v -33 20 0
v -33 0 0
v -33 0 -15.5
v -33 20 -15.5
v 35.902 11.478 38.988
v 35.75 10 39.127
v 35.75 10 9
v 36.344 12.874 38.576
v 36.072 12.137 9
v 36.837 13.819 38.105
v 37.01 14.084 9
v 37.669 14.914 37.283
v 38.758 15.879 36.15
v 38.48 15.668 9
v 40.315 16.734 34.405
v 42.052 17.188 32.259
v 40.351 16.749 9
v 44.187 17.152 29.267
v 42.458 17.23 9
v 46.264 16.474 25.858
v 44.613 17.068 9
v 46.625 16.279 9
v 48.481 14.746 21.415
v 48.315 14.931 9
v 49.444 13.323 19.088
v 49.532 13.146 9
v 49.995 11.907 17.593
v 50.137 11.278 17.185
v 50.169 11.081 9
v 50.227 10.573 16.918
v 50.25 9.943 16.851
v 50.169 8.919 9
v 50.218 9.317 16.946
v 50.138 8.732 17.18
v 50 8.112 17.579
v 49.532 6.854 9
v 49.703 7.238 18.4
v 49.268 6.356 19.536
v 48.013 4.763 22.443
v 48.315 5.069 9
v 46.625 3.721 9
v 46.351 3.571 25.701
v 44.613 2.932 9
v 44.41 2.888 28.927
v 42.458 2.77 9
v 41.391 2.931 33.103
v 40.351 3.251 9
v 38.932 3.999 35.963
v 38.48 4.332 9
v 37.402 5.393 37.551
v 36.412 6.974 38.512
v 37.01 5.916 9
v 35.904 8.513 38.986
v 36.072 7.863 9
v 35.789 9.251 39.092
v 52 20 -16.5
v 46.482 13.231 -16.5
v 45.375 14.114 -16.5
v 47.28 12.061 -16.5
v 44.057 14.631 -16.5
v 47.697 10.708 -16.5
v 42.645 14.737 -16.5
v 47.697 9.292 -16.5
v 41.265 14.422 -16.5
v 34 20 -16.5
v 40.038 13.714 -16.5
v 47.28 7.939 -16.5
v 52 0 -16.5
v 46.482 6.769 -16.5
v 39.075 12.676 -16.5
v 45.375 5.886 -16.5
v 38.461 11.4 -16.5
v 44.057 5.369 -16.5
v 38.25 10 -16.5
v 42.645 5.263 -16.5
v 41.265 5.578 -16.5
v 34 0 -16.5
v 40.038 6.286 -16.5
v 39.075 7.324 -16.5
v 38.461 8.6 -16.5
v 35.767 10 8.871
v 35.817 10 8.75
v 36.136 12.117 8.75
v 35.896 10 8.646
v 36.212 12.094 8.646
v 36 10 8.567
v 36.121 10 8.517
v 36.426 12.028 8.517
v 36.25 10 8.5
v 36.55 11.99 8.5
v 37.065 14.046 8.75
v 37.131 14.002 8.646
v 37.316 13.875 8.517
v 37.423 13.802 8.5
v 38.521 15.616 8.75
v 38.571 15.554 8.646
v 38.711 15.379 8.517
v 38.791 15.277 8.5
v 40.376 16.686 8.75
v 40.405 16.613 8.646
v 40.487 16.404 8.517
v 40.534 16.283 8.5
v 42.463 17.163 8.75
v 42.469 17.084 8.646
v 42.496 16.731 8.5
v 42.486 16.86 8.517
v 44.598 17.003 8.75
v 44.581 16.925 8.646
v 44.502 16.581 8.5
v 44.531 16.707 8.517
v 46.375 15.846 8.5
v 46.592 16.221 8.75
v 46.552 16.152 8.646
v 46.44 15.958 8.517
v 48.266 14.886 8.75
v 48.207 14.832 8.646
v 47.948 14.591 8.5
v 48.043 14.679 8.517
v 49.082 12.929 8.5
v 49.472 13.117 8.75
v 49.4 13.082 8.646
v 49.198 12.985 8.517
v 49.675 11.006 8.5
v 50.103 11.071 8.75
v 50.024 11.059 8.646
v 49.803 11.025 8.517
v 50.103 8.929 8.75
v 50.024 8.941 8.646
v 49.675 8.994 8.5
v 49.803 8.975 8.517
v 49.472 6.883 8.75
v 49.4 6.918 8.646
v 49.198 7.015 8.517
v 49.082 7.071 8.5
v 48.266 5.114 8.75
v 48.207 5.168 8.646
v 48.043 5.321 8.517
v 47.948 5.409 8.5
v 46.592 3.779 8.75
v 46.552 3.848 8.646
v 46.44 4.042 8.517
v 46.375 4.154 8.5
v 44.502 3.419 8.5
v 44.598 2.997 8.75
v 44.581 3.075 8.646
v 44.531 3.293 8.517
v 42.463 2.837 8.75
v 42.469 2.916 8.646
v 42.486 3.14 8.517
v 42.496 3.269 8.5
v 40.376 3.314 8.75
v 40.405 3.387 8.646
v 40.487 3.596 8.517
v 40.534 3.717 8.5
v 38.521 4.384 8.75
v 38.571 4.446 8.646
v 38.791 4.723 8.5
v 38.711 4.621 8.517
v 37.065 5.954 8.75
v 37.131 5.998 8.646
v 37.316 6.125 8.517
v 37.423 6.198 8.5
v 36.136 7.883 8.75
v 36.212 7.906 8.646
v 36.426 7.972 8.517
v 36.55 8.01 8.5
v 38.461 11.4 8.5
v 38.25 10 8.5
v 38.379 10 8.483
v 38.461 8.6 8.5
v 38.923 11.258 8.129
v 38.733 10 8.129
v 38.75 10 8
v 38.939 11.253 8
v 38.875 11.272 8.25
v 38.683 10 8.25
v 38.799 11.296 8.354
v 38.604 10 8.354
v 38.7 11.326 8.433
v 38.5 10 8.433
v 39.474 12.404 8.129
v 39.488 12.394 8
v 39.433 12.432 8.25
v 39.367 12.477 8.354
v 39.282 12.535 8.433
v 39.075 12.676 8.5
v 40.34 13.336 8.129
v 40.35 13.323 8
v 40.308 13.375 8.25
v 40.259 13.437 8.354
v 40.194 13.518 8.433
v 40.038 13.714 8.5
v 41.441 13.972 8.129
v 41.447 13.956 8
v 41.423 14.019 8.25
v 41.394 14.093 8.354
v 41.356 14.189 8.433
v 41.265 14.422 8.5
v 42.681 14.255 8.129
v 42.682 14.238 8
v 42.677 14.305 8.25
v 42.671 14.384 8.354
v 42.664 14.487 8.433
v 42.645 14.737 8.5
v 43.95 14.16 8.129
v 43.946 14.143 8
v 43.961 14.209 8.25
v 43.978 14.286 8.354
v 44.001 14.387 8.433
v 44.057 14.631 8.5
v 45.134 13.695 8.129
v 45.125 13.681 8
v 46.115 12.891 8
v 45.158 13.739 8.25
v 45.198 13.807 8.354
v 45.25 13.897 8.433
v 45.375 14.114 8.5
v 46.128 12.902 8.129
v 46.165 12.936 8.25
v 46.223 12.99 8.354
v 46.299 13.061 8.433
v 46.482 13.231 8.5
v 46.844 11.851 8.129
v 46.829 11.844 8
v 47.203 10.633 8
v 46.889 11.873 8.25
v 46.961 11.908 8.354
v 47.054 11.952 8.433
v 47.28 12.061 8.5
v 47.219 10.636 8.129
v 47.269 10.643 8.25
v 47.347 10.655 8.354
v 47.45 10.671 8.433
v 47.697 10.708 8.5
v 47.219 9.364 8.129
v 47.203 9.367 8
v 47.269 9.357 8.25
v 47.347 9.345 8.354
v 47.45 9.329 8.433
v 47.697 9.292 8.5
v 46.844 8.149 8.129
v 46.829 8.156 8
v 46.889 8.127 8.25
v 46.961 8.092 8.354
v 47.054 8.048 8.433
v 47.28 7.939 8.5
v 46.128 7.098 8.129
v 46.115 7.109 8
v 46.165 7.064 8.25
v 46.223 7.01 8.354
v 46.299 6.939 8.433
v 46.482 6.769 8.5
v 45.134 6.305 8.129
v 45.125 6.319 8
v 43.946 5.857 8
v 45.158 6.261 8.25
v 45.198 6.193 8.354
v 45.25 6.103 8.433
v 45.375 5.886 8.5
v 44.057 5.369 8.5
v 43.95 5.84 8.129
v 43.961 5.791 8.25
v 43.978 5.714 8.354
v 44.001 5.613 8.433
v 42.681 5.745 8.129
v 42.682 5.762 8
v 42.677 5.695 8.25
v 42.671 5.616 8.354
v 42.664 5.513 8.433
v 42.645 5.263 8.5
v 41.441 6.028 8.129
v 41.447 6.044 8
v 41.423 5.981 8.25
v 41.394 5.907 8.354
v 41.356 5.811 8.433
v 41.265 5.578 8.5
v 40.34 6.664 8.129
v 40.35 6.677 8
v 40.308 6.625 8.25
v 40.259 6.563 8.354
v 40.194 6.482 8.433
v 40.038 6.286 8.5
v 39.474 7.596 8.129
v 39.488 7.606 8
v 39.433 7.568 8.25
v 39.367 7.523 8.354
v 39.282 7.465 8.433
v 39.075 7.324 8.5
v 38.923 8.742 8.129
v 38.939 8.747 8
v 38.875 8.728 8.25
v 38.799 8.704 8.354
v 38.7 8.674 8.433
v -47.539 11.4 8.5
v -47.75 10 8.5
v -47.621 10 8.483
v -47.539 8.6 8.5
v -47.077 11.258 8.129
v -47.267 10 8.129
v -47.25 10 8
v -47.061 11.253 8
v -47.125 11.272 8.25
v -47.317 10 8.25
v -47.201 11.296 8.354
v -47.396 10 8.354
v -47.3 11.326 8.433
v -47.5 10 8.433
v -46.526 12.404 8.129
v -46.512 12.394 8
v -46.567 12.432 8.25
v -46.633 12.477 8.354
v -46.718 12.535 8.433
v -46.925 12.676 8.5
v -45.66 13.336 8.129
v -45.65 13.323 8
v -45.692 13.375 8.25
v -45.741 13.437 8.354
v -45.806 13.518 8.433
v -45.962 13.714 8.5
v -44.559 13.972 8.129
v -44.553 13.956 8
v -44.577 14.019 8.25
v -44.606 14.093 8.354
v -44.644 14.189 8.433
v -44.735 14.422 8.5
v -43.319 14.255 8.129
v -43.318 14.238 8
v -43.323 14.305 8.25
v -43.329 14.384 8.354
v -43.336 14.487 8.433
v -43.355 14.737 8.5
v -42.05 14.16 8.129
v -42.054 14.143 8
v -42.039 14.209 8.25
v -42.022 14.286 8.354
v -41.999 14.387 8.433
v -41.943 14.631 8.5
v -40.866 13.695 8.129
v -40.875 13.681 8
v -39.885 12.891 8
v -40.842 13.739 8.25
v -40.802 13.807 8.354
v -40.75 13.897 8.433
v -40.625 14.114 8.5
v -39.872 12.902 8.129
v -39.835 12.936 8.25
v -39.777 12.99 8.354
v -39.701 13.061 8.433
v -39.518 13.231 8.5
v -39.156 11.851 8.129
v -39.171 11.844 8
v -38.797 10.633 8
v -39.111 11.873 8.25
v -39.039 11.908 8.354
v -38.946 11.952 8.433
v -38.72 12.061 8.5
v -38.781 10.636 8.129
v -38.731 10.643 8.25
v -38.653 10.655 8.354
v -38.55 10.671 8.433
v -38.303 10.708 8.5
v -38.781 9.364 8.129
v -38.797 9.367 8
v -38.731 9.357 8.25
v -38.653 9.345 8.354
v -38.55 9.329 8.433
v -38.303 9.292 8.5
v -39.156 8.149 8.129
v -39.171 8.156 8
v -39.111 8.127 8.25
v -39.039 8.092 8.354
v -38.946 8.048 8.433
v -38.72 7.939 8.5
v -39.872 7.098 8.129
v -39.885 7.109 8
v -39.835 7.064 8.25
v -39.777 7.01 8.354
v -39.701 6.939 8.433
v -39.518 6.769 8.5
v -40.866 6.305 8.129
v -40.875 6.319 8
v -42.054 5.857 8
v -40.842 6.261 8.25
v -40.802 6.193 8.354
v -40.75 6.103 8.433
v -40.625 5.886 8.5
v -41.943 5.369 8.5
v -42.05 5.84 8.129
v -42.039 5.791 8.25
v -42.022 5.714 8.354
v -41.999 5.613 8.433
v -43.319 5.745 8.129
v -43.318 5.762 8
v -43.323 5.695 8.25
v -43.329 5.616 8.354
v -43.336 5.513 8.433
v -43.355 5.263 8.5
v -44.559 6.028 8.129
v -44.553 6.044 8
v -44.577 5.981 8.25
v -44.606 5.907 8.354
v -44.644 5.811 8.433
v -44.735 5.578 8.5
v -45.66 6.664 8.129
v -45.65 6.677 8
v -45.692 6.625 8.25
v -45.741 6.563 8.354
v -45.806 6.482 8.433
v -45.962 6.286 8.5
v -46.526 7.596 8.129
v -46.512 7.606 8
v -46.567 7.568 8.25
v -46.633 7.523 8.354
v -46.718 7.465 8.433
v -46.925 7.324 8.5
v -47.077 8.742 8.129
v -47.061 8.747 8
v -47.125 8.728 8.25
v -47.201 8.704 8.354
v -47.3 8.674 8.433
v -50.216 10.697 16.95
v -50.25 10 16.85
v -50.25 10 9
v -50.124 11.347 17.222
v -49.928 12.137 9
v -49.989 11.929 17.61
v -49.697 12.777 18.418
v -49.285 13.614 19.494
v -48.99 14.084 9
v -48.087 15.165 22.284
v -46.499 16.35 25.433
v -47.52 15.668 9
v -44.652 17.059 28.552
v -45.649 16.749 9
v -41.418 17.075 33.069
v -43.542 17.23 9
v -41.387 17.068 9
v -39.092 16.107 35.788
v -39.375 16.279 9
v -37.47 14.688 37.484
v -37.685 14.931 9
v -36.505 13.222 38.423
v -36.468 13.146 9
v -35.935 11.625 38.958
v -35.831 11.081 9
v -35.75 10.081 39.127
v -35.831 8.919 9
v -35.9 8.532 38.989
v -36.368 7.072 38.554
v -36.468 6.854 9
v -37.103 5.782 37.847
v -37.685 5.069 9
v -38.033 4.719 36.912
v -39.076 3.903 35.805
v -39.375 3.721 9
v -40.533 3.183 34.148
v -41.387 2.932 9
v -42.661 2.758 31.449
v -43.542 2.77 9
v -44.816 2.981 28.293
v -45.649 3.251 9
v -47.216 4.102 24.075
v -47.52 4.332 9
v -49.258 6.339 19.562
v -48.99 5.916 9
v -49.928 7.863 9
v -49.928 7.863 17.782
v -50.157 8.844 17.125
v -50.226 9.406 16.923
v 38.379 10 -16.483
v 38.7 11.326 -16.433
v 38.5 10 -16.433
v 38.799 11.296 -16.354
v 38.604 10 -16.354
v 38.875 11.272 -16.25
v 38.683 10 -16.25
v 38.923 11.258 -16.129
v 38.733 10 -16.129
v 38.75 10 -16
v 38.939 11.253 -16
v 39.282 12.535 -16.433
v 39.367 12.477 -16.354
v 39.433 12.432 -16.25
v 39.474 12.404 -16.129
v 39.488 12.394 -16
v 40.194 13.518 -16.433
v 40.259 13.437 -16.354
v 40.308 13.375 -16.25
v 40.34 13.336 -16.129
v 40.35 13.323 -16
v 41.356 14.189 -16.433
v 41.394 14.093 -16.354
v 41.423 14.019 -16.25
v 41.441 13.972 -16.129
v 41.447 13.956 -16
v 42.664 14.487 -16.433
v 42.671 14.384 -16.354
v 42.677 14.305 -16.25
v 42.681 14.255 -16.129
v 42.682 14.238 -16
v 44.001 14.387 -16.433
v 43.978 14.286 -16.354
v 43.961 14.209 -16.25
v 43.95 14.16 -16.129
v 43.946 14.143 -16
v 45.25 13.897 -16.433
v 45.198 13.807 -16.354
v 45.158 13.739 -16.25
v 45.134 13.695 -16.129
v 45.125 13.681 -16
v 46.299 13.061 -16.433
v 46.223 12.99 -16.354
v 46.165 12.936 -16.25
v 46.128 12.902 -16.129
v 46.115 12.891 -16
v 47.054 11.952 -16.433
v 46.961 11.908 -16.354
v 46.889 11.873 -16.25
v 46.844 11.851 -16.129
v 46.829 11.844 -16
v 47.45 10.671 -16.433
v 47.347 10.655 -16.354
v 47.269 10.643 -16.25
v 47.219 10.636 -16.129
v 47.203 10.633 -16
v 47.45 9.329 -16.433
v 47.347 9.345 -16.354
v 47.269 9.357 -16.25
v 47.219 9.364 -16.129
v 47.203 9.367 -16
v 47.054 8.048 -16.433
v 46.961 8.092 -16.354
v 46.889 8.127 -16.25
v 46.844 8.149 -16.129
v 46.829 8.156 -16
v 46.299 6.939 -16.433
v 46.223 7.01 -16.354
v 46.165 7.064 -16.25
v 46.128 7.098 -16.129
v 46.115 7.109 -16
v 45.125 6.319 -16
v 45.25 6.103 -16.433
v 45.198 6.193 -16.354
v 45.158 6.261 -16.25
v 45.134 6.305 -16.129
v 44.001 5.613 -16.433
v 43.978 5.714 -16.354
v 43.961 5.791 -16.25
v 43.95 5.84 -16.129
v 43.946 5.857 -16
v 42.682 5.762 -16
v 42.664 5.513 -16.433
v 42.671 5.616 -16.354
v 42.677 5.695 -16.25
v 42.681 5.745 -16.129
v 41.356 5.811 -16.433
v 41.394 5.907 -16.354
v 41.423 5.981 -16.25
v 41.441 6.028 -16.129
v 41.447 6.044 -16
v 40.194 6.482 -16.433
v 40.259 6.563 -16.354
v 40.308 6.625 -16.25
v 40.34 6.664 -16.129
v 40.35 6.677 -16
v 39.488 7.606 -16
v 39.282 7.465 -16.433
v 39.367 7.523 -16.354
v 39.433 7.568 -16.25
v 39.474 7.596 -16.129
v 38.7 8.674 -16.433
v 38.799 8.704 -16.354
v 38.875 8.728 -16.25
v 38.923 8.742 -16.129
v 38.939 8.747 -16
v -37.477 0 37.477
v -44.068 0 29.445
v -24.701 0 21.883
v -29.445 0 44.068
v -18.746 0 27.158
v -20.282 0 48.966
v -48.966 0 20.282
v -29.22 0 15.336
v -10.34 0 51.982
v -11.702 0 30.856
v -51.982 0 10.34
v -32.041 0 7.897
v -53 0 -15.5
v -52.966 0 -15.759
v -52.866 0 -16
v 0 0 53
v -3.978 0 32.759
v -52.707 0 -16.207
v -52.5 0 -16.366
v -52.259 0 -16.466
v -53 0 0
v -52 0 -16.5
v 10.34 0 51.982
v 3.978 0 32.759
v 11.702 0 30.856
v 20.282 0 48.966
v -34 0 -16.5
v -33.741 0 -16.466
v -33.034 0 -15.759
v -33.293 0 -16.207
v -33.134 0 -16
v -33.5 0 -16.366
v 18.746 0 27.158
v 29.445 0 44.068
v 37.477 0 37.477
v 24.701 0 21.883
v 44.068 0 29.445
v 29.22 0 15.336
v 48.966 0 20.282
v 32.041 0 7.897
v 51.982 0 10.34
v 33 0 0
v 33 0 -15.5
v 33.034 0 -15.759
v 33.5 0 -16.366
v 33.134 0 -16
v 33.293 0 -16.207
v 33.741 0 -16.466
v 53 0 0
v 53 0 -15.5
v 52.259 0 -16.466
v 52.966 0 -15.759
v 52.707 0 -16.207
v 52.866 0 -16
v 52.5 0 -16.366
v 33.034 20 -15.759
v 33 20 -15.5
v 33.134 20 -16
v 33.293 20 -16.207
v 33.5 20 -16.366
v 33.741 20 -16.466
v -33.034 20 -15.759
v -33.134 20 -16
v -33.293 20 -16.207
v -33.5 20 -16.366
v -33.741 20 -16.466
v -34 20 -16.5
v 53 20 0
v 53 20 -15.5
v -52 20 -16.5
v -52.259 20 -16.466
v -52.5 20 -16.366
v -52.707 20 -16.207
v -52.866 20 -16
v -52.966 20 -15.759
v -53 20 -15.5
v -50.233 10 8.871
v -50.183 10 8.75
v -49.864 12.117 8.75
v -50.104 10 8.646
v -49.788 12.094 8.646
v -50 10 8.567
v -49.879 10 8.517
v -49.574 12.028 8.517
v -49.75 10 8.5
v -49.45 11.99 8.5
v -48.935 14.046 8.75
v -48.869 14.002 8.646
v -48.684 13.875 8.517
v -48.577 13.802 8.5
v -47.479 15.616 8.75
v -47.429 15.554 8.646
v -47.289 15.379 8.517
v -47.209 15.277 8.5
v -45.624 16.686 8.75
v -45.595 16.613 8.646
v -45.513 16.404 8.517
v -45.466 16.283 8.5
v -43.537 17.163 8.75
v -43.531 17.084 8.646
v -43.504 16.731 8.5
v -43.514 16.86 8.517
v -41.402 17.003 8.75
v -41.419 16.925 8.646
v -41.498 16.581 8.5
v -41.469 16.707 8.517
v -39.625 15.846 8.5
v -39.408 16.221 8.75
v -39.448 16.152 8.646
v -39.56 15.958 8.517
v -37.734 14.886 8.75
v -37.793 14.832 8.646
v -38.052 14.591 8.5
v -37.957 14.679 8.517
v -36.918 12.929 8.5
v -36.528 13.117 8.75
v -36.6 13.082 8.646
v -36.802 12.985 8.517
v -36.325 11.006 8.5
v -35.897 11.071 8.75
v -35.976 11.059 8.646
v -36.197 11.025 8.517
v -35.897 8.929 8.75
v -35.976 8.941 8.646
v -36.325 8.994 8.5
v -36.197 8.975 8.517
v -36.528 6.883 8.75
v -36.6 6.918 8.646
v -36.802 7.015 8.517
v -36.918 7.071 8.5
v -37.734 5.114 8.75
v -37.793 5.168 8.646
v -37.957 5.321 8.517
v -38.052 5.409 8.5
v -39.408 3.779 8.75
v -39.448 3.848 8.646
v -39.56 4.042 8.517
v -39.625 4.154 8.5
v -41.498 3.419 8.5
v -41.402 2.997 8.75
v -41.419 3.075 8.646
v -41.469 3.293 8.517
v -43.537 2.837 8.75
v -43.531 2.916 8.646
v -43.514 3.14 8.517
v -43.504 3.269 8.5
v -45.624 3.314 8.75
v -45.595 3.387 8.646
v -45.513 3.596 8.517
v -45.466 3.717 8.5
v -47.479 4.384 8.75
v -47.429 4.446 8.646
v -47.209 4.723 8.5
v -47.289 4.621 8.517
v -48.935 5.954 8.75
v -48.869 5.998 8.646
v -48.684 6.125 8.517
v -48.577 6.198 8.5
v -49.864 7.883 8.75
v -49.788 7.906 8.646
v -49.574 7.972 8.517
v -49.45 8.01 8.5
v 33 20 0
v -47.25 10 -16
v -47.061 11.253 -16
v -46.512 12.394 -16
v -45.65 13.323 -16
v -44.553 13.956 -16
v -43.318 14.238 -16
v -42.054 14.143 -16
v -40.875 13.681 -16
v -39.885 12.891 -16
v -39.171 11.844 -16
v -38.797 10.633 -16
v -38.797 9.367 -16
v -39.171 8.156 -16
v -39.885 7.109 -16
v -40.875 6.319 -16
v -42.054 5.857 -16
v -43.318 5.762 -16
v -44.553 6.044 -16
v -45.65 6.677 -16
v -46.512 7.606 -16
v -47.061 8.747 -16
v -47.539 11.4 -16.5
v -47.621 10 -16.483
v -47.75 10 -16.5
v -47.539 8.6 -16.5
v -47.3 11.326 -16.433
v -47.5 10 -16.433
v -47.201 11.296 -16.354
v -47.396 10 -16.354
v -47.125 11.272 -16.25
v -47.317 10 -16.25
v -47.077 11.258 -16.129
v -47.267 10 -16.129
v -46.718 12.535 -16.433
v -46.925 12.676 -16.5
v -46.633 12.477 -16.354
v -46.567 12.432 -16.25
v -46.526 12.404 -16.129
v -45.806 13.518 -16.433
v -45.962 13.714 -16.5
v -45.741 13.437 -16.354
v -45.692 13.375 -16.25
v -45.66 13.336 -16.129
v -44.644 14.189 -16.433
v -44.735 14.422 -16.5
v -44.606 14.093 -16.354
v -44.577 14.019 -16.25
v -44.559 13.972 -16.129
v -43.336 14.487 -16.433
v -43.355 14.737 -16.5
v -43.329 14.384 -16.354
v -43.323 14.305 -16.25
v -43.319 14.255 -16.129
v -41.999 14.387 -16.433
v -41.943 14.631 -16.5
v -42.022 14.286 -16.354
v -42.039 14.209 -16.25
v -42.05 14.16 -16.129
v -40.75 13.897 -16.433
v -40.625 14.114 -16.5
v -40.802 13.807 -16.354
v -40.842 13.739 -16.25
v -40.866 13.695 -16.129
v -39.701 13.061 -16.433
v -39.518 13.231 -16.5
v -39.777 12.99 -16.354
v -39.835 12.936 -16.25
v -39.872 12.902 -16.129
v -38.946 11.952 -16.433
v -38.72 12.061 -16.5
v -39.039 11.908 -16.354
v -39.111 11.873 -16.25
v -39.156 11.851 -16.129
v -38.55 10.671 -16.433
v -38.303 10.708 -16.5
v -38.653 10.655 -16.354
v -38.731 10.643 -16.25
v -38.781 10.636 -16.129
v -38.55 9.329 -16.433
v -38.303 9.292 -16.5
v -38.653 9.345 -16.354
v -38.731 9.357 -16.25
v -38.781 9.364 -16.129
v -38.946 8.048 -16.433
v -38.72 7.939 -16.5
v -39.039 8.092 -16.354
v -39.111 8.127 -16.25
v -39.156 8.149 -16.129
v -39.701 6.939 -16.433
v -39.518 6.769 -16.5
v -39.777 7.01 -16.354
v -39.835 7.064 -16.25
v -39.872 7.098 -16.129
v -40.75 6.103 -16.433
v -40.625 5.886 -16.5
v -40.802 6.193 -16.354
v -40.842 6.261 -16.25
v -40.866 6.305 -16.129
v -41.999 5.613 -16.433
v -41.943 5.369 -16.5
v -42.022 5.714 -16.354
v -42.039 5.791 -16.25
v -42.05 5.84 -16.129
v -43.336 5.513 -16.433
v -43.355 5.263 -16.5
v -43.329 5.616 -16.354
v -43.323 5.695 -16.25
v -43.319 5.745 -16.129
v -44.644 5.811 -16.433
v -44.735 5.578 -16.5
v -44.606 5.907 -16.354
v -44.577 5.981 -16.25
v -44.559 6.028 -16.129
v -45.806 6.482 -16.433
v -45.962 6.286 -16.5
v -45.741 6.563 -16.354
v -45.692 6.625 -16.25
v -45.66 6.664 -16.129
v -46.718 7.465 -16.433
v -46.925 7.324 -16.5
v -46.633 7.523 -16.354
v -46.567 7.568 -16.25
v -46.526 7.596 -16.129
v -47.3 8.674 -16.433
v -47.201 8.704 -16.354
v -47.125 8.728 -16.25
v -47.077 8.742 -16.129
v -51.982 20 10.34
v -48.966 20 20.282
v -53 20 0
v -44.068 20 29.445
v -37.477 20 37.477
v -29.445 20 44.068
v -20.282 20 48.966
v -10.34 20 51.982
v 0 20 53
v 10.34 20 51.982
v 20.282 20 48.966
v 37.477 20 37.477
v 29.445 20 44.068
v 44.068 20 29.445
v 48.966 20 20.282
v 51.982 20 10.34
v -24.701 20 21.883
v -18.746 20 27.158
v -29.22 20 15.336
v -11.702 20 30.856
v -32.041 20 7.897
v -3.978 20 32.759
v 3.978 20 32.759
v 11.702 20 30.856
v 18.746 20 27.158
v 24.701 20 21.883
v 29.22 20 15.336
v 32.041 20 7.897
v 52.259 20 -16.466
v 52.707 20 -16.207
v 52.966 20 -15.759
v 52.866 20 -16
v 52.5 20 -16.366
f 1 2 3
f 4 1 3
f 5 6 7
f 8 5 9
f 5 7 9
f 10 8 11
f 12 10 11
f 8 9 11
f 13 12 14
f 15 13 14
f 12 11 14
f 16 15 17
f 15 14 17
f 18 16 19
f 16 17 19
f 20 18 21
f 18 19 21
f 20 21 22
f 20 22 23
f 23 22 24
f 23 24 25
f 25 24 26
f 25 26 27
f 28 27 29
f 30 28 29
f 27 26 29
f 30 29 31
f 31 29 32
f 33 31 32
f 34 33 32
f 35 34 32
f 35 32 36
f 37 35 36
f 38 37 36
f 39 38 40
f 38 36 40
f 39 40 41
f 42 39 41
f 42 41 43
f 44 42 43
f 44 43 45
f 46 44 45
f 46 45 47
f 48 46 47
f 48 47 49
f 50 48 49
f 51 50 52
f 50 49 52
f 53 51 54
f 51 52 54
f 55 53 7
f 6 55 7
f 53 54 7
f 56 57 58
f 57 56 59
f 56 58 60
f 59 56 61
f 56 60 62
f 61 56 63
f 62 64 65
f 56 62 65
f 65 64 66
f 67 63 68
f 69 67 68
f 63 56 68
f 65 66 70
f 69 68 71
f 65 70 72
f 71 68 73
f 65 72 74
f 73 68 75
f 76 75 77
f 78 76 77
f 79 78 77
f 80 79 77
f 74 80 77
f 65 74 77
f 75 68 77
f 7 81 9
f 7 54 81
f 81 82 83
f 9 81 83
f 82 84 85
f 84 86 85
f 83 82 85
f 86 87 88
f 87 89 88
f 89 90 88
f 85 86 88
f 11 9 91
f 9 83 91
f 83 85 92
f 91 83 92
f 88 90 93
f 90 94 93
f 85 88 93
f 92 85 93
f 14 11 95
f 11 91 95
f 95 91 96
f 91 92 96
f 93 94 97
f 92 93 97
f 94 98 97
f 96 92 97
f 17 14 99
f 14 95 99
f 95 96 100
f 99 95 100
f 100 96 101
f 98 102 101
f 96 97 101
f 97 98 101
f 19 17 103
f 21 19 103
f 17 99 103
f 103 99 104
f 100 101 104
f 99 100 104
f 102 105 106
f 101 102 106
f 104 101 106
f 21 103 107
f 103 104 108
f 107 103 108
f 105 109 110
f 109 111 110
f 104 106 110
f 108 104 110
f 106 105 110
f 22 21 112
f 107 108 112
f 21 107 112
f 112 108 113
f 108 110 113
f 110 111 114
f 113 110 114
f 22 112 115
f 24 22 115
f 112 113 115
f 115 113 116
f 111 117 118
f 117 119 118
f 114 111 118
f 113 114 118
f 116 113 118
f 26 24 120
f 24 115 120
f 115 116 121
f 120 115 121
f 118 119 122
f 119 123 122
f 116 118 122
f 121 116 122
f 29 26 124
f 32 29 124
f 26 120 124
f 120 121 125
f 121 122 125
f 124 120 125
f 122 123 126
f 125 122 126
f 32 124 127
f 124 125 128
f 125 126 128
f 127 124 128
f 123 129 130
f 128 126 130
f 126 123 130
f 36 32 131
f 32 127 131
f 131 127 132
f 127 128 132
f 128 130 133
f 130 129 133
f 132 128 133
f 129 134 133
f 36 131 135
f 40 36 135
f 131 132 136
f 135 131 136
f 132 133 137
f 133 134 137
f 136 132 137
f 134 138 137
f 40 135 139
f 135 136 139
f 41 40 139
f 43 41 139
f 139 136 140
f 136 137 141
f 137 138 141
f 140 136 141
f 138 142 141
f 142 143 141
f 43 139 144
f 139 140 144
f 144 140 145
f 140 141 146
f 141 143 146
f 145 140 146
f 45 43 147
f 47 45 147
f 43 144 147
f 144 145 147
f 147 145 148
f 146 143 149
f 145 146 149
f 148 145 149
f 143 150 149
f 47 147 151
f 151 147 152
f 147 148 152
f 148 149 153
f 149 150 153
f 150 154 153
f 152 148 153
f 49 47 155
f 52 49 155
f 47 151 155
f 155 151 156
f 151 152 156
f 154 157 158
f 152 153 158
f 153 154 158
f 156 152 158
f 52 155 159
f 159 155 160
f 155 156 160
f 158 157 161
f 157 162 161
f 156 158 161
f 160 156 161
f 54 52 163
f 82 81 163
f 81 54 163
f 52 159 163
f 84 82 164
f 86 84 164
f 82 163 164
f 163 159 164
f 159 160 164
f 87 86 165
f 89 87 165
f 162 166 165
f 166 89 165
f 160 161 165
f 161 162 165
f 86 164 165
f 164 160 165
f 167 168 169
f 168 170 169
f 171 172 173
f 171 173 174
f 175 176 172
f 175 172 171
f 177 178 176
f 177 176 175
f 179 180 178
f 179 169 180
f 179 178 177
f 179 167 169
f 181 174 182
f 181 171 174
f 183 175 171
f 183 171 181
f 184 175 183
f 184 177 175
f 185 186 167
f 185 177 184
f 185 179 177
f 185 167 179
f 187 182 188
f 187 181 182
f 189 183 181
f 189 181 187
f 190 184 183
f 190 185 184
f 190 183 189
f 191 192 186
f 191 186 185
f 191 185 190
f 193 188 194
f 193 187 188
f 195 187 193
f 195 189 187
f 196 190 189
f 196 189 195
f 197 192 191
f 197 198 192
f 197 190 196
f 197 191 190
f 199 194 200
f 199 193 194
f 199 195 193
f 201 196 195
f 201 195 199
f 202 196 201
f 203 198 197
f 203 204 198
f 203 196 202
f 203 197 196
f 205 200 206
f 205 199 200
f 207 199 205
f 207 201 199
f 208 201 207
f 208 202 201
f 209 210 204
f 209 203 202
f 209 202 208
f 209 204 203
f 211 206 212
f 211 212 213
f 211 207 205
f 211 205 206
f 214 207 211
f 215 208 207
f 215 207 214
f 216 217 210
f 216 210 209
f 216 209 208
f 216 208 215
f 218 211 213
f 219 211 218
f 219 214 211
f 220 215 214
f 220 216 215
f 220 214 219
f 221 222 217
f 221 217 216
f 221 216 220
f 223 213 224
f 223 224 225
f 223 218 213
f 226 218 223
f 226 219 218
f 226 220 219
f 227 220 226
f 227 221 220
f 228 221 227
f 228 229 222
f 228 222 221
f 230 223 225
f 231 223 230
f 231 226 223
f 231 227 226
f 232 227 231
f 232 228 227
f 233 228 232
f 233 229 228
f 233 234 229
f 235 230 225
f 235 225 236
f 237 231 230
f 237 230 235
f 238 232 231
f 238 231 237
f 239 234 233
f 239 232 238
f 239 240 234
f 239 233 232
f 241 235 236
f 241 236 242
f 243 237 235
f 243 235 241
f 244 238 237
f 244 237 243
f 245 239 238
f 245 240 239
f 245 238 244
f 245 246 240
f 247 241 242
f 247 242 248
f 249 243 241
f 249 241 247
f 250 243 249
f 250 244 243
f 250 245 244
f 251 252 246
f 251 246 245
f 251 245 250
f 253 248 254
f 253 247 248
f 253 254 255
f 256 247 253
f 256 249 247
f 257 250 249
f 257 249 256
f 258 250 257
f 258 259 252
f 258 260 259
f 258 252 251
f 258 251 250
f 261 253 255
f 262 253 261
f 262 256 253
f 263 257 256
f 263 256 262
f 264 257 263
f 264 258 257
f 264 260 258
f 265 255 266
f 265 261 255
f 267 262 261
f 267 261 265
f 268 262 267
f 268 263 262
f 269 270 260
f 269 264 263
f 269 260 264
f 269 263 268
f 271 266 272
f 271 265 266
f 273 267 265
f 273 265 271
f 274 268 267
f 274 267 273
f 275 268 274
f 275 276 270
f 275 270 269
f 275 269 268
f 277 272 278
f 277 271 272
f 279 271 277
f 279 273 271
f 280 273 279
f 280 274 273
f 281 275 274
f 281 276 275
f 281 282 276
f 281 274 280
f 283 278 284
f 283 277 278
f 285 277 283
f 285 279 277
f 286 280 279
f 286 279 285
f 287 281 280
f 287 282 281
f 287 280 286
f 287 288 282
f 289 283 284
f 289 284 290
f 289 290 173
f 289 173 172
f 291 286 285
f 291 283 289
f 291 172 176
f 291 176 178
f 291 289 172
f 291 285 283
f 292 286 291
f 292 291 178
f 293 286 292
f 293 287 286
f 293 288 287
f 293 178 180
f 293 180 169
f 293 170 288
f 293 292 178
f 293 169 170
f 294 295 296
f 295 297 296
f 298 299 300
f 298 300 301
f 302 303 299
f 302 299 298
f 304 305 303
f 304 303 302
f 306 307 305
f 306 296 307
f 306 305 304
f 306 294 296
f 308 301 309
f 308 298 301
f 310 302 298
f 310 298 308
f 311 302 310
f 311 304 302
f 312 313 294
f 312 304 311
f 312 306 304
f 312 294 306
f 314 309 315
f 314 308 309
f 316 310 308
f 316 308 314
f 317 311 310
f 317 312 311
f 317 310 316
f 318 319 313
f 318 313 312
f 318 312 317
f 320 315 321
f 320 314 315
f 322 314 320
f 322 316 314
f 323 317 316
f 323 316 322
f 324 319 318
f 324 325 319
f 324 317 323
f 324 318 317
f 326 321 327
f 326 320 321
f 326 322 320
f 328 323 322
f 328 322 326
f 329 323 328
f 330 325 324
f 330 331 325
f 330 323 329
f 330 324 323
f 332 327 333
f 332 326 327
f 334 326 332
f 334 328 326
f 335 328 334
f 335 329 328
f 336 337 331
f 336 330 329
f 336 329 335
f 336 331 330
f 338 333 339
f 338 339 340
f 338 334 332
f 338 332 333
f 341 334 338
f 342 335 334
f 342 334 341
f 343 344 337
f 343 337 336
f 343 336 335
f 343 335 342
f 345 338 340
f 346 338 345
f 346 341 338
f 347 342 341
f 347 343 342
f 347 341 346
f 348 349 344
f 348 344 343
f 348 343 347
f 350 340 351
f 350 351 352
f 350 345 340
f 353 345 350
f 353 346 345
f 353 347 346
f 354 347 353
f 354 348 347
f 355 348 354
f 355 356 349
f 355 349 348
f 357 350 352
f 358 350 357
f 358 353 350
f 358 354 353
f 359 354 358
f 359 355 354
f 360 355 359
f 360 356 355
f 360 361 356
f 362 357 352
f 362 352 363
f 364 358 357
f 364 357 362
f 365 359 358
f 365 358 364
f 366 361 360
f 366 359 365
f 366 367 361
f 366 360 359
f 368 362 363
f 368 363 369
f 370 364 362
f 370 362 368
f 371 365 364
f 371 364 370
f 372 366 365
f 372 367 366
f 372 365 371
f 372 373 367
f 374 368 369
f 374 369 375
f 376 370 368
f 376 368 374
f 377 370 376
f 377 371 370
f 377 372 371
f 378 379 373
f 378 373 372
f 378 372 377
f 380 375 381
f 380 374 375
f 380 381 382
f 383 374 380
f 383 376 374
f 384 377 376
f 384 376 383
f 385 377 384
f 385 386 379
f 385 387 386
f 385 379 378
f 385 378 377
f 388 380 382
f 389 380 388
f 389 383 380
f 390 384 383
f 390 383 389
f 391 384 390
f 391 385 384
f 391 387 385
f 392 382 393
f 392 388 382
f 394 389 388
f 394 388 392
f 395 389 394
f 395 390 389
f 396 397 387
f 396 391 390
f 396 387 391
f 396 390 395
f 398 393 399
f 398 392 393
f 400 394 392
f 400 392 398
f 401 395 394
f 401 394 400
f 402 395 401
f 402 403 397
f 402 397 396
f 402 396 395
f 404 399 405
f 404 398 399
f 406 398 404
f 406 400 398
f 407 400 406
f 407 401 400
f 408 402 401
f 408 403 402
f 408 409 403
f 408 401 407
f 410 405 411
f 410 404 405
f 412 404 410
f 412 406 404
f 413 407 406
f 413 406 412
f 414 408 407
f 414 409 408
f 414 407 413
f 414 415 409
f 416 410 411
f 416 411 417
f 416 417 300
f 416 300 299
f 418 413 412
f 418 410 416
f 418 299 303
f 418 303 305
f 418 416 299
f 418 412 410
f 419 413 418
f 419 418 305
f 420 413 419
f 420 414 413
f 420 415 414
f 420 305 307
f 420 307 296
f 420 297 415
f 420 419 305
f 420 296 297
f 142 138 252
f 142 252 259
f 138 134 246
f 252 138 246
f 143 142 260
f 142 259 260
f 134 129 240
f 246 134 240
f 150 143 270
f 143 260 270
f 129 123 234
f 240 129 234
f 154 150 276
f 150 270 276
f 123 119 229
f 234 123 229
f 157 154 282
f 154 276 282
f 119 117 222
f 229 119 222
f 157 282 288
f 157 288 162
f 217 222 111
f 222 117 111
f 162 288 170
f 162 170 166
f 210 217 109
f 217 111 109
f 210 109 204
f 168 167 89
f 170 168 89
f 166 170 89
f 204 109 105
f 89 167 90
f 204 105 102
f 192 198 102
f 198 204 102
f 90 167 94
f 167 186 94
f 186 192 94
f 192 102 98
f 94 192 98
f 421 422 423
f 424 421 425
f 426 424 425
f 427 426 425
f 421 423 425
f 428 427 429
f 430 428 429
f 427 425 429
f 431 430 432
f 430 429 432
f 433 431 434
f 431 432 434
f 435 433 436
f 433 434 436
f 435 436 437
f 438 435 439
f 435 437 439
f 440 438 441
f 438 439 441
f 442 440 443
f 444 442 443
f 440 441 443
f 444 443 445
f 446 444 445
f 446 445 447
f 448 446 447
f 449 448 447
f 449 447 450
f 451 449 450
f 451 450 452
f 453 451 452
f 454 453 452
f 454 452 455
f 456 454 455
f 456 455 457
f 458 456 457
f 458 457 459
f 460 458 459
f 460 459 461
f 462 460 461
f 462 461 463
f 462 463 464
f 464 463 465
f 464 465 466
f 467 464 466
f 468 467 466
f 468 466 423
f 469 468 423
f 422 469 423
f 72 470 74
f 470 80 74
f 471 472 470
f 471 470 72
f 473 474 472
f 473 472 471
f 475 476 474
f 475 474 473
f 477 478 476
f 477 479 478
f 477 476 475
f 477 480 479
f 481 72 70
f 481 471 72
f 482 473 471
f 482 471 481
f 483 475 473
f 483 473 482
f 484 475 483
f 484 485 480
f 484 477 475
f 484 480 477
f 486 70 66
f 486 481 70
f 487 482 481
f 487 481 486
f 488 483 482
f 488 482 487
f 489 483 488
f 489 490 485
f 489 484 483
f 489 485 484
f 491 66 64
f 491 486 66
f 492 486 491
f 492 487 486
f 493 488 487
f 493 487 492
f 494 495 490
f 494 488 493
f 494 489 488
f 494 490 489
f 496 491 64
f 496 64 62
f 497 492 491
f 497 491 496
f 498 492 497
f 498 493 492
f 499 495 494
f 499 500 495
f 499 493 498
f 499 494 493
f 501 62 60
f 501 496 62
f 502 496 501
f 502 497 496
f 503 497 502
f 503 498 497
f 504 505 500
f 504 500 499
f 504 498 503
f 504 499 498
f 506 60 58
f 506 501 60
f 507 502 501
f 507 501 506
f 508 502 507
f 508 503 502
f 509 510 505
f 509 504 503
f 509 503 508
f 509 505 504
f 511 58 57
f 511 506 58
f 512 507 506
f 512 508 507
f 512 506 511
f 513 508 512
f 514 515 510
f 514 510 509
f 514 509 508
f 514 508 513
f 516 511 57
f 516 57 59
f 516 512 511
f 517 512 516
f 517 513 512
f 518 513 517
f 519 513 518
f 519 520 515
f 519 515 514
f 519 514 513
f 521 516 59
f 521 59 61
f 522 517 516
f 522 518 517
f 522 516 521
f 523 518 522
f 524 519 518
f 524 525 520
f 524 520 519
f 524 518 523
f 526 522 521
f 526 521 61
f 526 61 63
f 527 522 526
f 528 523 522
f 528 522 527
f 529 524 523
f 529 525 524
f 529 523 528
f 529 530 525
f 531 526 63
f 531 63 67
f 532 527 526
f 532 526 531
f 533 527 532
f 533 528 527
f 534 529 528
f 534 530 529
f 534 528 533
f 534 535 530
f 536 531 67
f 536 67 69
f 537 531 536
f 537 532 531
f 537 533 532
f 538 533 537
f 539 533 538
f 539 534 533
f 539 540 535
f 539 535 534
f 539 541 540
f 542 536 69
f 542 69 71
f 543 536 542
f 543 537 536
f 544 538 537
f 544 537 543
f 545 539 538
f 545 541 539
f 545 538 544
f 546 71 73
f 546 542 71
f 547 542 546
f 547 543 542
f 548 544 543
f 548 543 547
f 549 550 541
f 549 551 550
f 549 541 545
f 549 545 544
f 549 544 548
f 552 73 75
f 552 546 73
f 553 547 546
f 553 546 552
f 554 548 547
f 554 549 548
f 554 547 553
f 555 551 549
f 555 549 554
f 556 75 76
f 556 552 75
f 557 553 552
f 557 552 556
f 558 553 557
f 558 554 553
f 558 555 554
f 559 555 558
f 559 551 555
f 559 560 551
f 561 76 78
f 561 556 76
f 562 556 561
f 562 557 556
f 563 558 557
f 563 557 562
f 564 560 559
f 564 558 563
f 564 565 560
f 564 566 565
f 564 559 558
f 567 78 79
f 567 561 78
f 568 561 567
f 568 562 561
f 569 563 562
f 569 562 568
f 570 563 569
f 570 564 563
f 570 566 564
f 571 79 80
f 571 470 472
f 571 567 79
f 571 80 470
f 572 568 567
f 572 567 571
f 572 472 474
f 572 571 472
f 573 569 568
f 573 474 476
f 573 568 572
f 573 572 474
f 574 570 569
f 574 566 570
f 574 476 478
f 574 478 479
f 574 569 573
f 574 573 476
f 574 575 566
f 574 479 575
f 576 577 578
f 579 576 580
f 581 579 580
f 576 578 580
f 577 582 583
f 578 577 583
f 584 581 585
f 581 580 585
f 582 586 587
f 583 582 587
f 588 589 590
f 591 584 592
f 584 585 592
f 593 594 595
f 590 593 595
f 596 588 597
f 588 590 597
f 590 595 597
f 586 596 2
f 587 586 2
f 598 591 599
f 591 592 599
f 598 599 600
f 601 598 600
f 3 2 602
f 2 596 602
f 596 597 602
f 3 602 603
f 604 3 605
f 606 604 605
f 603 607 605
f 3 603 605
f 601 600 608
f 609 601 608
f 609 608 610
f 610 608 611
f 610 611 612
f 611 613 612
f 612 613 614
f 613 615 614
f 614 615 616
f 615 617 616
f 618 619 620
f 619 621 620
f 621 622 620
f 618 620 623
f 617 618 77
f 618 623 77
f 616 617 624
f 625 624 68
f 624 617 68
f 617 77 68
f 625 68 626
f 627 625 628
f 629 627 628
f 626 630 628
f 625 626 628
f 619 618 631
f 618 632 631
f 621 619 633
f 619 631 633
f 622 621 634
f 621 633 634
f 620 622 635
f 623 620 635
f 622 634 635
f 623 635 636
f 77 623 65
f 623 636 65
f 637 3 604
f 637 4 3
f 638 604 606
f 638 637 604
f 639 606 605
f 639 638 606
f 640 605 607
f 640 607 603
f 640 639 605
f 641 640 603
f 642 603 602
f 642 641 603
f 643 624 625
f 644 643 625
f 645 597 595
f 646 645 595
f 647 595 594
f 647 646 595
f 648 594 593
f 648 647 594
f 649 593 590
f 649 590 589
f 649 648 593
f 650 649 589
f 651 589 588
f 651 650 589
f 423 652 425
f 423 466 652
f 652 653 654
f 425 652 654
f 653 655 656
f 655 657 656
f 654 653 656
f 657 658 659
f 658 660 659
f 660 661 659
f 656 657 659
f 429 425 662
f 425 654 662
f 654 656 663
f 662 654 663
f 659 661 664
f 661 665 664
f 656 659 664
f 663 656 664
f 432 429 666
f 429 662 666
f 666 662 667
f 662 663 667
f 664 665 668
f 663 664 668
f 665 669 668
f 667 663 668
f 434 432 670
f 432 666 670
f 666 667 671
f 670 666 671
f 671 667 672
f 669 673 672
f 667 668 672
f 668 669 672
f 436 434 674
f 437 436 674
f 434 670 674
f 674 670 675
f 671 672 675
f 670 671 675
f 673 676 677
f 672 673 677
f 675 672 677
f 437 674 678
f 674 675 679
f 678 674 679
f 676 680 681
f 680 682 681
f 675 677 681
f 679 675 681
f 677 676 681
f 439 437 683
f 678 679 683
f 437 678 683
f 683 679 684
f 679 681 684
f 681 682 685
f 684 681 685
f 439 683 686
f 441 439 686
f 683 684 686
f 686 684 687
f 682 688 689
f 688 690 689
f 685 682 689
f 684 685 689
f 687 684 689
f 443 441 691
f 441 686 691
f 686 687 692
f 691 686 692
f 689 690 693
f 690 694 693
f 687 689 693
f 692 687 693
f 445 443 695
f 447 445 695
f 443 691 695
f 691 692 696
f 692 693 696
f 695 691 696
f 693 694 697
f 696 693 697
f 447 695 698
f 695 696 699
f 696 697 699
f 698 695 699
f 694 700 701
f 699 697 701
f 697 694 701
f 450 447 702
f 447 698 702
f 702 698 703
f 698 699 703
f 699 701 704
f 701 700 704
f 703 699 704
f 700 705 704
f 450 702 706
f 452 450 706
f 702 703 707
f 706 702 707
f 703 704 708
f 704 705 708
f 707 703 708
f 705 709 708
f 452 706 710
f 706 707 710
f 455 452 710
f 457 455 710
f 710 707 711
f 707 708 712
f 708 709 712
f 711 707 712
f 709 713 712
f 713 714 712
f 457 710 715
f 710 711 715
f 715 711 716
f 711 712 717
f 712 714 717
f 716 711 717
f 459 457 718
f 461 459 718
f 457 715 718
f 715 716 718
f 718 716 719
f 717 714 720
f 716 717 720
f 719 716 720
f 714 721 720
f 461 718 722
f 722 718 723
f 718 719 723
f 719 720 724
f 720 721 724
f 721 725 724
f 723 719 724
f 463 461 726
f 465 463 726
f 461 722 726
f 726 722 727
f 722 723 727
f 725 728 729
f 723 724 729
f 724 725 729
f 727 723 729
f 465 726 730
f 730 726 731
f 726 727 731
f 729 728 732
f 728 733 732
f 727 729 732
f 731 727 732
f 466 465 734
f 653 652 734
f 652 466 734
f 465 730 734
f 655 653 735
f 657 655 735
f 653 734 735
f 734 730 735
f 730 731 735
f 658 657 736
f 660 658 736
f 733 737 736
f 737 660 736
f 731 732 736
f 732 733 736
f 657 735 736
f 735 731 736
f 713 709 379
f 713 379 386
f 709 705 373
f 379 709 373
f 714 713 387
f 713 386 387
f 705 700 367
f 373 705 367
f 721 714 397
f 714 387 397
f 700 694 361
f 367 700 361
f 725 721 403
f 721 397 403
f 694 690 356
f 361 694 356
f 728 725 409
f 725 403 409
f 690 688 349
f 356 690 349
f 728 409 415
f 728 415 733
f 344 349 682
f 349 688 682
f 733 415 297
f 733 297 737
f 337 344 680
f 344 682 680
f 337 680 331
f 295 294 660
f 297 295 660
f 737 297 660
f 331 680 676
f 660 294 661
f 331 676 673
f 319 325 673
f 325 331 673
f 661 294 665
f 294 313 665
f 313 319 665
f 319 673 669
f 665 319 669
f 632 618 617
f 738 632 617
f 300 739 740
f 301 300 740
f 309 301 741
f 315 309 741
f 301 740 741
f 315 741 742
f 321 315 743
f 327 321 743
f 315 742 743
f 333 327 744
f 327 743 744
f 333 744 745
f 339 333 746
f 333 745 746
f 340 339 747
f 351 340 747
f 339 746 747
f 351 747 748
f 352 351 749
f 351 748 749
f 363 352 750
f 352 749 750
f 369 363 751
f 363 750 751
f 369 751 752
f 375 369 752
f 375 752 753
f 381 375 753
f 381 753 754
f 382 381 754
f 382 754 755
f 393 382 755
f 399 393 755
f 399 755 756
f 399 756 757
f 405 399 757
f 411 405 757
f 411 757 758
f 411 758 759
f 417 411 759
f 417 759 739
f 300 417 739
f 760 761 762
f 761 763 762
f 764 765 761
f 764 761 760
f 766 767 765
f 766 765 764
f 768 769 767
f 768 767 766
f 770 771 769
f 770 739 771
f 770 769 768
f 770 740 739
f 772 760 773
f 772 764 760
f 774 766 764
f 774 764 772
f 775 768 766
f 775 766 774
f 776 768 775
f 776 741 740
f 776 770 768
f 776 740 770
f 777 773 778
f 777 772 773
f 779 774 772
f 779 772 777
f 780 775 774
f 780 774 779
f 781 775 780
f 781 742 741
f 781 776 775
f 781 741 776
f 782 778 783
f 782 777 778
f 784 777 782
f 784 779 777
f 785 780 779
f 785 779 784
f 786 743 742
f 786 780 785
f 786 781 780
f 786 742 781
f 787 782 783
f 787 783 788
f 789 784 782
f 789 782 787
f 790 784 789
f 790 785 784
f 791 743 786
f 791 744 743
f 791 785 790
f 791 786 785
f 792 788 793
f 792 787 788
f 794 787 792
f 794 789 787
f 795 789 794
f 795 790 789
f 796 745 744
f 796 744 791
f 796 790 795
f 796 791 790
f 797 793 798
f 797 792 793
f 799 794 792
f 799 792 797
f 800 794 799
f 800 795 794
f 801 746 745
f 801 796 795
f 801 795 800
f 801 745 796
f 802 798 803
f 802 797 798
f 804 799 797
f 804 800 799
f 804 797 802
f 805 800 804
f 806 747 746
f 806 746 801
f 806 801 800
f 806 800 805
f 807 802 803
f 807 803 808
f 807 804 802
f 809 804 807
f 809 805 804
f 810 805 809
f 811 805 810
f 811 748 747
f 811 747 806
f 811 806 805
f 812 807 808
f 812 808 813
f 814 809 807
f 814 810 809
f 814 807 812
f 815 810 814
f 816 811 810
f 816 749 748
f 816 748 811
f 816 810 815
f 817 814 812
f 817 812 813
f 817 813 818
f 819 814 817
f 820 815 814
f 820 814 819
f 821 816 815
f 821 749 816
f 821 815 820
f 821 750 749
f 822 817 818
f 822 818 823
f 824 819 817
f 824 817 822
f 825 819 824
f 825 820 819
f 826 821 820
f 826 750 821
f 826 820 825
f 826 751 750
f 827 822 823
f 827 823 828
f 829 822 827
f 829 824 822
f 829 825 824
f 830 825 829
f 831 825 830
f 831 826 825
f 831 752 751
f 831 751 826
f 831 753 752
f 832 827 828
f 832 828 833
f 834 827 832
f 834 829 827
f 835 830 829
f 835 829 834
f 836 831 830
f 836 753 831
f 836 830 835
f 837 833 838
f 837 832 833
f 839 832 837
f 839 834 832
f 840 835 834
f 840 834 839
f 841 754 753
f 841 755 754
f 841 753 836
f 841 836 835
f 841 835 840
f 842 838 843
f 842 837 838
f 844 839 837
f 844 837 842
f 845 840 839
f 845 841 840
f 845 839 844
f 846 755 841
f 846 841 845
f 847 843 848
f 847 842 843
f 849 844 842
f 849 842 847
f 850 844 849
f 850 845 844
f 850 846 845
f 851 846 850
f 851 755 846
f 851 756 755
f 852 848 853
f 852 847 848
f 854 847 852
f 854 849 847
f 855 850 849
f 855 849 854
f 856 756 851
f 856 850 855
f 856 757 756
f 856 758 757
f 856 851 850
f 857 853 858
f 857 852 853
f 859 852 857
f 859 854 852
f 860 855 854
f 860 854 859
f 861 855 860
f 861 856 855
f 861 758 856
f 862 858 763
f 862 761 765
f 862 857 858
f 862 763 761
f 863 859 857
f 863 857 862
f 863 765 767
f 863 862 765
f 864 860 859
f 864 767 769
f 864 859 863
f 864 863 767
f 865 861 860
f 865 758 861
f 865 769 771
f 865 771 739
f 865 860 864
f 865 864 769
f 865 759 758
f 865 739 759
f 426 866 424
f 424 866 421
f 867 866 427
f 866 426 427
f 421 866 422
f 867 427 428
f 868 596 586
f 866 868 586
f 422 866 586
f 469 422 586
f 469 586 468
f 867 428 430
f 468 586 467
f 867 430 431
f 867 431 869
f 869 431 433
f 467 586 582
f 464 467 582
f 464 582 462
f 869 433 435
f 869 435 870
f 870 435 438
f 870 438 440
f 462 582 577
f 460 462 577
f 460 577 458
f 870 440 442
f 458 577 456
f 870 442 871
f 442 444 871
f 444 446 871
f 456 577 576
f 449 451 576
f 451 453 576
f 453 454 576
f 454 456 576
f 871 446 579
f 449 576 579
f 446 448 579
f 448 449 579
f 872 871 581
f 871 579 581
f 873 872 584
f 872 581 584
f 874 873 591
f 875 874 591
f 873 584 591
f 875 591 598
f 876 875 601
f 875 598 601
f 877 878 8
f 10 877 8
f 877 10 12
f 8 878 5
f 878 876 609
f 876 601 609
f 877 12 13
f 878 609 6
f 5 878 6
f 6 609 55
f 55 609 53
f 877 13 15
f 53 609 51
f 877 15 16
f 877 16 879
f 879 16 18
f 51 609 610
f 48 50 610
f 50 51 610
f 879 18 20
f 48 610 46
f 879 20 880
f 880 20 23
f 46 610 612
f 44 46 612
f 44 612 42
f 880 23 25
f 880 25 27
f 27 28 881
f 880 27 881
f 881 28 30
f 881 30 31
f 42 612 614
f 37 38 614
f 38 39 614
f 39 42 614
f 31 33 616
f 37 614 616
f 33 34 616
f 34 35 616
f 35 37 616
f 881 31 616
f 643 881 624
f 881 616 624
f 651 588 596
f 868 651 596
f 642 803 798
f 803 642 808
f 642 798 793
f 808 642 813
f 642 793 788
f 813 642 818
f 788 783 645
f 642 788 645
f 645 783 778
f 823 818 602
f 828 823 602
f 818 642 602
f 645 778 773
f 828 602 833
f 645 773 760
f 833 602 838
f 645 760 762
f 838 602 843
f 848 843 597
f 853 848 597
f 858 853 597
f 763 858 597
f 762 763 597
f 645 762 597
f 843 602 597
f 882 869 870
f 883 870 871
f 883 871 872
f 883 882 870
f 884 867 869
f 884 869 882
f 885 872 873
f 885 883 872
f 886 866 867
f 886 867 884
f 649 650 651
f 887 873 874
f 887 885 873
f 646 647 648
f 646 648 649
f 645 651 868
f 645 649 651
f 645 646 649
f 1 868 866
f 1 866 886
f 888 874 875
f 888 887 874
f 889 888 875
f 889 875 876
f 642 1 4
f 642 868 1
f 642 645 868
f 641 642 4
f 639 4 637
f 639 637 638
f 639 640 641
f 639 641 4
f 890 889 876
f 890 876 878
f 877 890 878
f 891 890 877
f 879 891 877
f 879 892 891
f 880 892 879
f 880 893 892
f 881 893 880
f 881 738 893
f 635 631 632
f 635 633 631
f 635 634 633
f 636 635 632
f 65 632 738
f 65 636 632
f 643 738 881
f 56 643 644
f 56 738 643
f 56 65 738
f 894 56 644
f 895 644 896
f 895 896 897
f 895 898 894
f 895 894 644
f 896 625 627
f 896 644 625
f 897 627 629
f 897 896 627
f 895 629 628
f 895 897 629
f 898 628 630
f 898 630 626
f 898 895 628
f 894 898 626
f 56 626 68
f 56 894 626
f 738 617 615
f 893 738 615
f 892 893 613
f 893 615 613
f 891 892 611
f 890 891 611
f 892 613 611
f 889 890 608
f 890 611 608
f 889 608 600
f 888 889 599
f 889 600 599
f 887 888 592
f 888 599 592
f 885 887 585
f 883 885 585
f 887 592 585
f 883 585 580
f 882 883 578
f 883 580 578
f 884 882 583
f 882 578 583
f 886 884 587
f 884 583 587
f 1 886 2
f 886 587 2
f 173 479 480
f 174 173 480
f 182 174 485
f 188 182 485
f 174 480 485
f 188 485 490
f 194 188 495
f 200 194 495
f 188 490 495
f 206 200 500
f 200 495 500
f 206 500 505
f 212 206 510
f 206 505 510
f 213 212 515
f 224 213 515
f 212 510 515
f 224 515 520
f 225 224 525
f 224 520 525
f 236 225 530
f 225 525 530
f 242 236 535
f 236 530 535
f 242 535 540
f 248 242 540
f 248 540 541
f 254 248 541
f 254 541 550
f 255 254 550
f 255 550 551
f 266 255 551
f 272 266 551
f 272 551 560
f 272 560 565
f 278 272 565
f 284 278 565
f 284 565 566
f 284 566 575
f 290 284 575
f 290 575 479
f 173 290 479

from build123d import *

# Parameters (mm, degrees)
BOSS_EXTRUDE1_DEPTH = 20
SKETCH2_R           = 4.25
CUT_EXTRUDE1_DEPTH  = 60
CUT_EXTRUDE2_START  = -25
SKETCH3_R           = 7.25
CUT_EXTRUDE2_DEPTH  = 50
FILLET1_R           = 1
FILLET2_R           = 0.5


with BuildPart() as part:
    # Sketch1 → Boss-Extrude1 (new body)
    with BuildSketch(Plane(origin=(0, 0, 0), x_dir=(1, 0, 0), z_dir=(0, 1, 0))):
        with BuildLine():
            Line((-33, 0), (-33, 16.5))
            Line((-33, 16.5), (-53, 16.5))
            Line((-53, 16.5), (-53, 0))
            ThreePointArc((-53, 0), (0, -53), (53, 0))
            Line((53, 0), (53, 16.5))
            Line((53, 16.5), (33, 16.5))
            Line((33, 16.5), (33, 0))
            ThreePointArc((33, 0), (0, -33), (-33, 0))
        make_face()
    extrude(amount=BOSS_EXTRUDE1_DEPTH)

    # Sketch2 → Cut-Extrude1 (cut)
    with BuildSketch(Plane(origin=(0, 0, -16.5), x_dir=(-1, 0, 0), z_dir=(0, 0, -1))):
        with Locations((-43, 10)):
            Circle(SKETCH2_R)
        with Locations((43, 10)):
            Circle(SKETCH2_R)
    extrude(amount=-CUT_EXTRUDE1_DEPTH, mode=Mode.SUBTRACT)

    # Sketch3 → Cut-Extrude2 (cut)
    with BuildSketch(Plane(origin=(0, 0, -16.5), x_dir=(-1, 0, 0), z_dir=(0, 0, -1)).offset(CUT_EXTRUDE2_START)):
        with Locations((-43, 10)):
            Circle(SKETCH3_R)
        with Locations((43, 10)):
            Circle(SKETCH3_R)
    extrude(amount=-CUT_EXTRUDE2_DEPTH, mode=Mode.SUBTRACT)

    # Fillet1
    fillet1_edges = [part.edges().sort_by_distance(p)[0] for p in [
        (33, 10, -16.5),
        (53, 10, -16.5),
        (-53, 10, -16.5),
        (-33, 10, -16.5),
    ]]
    fillet(fillet1_edges, radius=FILLET1_R)

    # Fillet2
    fillet2_edges = [part.edges().sort_by_distance(p)[0] for p in [
        (47.25, 10, -16.5),
        (-38.75, 10, -16.5),
        (50.25, 10, 8.5),
        (47.25, 10, 8.5),
        (-35.75, 10, 8.5),
        (-38.75, 10, 8.5),
    ]]
    fillet(fillet2_edges, radius=FILLET2_R)


solid = part.part
